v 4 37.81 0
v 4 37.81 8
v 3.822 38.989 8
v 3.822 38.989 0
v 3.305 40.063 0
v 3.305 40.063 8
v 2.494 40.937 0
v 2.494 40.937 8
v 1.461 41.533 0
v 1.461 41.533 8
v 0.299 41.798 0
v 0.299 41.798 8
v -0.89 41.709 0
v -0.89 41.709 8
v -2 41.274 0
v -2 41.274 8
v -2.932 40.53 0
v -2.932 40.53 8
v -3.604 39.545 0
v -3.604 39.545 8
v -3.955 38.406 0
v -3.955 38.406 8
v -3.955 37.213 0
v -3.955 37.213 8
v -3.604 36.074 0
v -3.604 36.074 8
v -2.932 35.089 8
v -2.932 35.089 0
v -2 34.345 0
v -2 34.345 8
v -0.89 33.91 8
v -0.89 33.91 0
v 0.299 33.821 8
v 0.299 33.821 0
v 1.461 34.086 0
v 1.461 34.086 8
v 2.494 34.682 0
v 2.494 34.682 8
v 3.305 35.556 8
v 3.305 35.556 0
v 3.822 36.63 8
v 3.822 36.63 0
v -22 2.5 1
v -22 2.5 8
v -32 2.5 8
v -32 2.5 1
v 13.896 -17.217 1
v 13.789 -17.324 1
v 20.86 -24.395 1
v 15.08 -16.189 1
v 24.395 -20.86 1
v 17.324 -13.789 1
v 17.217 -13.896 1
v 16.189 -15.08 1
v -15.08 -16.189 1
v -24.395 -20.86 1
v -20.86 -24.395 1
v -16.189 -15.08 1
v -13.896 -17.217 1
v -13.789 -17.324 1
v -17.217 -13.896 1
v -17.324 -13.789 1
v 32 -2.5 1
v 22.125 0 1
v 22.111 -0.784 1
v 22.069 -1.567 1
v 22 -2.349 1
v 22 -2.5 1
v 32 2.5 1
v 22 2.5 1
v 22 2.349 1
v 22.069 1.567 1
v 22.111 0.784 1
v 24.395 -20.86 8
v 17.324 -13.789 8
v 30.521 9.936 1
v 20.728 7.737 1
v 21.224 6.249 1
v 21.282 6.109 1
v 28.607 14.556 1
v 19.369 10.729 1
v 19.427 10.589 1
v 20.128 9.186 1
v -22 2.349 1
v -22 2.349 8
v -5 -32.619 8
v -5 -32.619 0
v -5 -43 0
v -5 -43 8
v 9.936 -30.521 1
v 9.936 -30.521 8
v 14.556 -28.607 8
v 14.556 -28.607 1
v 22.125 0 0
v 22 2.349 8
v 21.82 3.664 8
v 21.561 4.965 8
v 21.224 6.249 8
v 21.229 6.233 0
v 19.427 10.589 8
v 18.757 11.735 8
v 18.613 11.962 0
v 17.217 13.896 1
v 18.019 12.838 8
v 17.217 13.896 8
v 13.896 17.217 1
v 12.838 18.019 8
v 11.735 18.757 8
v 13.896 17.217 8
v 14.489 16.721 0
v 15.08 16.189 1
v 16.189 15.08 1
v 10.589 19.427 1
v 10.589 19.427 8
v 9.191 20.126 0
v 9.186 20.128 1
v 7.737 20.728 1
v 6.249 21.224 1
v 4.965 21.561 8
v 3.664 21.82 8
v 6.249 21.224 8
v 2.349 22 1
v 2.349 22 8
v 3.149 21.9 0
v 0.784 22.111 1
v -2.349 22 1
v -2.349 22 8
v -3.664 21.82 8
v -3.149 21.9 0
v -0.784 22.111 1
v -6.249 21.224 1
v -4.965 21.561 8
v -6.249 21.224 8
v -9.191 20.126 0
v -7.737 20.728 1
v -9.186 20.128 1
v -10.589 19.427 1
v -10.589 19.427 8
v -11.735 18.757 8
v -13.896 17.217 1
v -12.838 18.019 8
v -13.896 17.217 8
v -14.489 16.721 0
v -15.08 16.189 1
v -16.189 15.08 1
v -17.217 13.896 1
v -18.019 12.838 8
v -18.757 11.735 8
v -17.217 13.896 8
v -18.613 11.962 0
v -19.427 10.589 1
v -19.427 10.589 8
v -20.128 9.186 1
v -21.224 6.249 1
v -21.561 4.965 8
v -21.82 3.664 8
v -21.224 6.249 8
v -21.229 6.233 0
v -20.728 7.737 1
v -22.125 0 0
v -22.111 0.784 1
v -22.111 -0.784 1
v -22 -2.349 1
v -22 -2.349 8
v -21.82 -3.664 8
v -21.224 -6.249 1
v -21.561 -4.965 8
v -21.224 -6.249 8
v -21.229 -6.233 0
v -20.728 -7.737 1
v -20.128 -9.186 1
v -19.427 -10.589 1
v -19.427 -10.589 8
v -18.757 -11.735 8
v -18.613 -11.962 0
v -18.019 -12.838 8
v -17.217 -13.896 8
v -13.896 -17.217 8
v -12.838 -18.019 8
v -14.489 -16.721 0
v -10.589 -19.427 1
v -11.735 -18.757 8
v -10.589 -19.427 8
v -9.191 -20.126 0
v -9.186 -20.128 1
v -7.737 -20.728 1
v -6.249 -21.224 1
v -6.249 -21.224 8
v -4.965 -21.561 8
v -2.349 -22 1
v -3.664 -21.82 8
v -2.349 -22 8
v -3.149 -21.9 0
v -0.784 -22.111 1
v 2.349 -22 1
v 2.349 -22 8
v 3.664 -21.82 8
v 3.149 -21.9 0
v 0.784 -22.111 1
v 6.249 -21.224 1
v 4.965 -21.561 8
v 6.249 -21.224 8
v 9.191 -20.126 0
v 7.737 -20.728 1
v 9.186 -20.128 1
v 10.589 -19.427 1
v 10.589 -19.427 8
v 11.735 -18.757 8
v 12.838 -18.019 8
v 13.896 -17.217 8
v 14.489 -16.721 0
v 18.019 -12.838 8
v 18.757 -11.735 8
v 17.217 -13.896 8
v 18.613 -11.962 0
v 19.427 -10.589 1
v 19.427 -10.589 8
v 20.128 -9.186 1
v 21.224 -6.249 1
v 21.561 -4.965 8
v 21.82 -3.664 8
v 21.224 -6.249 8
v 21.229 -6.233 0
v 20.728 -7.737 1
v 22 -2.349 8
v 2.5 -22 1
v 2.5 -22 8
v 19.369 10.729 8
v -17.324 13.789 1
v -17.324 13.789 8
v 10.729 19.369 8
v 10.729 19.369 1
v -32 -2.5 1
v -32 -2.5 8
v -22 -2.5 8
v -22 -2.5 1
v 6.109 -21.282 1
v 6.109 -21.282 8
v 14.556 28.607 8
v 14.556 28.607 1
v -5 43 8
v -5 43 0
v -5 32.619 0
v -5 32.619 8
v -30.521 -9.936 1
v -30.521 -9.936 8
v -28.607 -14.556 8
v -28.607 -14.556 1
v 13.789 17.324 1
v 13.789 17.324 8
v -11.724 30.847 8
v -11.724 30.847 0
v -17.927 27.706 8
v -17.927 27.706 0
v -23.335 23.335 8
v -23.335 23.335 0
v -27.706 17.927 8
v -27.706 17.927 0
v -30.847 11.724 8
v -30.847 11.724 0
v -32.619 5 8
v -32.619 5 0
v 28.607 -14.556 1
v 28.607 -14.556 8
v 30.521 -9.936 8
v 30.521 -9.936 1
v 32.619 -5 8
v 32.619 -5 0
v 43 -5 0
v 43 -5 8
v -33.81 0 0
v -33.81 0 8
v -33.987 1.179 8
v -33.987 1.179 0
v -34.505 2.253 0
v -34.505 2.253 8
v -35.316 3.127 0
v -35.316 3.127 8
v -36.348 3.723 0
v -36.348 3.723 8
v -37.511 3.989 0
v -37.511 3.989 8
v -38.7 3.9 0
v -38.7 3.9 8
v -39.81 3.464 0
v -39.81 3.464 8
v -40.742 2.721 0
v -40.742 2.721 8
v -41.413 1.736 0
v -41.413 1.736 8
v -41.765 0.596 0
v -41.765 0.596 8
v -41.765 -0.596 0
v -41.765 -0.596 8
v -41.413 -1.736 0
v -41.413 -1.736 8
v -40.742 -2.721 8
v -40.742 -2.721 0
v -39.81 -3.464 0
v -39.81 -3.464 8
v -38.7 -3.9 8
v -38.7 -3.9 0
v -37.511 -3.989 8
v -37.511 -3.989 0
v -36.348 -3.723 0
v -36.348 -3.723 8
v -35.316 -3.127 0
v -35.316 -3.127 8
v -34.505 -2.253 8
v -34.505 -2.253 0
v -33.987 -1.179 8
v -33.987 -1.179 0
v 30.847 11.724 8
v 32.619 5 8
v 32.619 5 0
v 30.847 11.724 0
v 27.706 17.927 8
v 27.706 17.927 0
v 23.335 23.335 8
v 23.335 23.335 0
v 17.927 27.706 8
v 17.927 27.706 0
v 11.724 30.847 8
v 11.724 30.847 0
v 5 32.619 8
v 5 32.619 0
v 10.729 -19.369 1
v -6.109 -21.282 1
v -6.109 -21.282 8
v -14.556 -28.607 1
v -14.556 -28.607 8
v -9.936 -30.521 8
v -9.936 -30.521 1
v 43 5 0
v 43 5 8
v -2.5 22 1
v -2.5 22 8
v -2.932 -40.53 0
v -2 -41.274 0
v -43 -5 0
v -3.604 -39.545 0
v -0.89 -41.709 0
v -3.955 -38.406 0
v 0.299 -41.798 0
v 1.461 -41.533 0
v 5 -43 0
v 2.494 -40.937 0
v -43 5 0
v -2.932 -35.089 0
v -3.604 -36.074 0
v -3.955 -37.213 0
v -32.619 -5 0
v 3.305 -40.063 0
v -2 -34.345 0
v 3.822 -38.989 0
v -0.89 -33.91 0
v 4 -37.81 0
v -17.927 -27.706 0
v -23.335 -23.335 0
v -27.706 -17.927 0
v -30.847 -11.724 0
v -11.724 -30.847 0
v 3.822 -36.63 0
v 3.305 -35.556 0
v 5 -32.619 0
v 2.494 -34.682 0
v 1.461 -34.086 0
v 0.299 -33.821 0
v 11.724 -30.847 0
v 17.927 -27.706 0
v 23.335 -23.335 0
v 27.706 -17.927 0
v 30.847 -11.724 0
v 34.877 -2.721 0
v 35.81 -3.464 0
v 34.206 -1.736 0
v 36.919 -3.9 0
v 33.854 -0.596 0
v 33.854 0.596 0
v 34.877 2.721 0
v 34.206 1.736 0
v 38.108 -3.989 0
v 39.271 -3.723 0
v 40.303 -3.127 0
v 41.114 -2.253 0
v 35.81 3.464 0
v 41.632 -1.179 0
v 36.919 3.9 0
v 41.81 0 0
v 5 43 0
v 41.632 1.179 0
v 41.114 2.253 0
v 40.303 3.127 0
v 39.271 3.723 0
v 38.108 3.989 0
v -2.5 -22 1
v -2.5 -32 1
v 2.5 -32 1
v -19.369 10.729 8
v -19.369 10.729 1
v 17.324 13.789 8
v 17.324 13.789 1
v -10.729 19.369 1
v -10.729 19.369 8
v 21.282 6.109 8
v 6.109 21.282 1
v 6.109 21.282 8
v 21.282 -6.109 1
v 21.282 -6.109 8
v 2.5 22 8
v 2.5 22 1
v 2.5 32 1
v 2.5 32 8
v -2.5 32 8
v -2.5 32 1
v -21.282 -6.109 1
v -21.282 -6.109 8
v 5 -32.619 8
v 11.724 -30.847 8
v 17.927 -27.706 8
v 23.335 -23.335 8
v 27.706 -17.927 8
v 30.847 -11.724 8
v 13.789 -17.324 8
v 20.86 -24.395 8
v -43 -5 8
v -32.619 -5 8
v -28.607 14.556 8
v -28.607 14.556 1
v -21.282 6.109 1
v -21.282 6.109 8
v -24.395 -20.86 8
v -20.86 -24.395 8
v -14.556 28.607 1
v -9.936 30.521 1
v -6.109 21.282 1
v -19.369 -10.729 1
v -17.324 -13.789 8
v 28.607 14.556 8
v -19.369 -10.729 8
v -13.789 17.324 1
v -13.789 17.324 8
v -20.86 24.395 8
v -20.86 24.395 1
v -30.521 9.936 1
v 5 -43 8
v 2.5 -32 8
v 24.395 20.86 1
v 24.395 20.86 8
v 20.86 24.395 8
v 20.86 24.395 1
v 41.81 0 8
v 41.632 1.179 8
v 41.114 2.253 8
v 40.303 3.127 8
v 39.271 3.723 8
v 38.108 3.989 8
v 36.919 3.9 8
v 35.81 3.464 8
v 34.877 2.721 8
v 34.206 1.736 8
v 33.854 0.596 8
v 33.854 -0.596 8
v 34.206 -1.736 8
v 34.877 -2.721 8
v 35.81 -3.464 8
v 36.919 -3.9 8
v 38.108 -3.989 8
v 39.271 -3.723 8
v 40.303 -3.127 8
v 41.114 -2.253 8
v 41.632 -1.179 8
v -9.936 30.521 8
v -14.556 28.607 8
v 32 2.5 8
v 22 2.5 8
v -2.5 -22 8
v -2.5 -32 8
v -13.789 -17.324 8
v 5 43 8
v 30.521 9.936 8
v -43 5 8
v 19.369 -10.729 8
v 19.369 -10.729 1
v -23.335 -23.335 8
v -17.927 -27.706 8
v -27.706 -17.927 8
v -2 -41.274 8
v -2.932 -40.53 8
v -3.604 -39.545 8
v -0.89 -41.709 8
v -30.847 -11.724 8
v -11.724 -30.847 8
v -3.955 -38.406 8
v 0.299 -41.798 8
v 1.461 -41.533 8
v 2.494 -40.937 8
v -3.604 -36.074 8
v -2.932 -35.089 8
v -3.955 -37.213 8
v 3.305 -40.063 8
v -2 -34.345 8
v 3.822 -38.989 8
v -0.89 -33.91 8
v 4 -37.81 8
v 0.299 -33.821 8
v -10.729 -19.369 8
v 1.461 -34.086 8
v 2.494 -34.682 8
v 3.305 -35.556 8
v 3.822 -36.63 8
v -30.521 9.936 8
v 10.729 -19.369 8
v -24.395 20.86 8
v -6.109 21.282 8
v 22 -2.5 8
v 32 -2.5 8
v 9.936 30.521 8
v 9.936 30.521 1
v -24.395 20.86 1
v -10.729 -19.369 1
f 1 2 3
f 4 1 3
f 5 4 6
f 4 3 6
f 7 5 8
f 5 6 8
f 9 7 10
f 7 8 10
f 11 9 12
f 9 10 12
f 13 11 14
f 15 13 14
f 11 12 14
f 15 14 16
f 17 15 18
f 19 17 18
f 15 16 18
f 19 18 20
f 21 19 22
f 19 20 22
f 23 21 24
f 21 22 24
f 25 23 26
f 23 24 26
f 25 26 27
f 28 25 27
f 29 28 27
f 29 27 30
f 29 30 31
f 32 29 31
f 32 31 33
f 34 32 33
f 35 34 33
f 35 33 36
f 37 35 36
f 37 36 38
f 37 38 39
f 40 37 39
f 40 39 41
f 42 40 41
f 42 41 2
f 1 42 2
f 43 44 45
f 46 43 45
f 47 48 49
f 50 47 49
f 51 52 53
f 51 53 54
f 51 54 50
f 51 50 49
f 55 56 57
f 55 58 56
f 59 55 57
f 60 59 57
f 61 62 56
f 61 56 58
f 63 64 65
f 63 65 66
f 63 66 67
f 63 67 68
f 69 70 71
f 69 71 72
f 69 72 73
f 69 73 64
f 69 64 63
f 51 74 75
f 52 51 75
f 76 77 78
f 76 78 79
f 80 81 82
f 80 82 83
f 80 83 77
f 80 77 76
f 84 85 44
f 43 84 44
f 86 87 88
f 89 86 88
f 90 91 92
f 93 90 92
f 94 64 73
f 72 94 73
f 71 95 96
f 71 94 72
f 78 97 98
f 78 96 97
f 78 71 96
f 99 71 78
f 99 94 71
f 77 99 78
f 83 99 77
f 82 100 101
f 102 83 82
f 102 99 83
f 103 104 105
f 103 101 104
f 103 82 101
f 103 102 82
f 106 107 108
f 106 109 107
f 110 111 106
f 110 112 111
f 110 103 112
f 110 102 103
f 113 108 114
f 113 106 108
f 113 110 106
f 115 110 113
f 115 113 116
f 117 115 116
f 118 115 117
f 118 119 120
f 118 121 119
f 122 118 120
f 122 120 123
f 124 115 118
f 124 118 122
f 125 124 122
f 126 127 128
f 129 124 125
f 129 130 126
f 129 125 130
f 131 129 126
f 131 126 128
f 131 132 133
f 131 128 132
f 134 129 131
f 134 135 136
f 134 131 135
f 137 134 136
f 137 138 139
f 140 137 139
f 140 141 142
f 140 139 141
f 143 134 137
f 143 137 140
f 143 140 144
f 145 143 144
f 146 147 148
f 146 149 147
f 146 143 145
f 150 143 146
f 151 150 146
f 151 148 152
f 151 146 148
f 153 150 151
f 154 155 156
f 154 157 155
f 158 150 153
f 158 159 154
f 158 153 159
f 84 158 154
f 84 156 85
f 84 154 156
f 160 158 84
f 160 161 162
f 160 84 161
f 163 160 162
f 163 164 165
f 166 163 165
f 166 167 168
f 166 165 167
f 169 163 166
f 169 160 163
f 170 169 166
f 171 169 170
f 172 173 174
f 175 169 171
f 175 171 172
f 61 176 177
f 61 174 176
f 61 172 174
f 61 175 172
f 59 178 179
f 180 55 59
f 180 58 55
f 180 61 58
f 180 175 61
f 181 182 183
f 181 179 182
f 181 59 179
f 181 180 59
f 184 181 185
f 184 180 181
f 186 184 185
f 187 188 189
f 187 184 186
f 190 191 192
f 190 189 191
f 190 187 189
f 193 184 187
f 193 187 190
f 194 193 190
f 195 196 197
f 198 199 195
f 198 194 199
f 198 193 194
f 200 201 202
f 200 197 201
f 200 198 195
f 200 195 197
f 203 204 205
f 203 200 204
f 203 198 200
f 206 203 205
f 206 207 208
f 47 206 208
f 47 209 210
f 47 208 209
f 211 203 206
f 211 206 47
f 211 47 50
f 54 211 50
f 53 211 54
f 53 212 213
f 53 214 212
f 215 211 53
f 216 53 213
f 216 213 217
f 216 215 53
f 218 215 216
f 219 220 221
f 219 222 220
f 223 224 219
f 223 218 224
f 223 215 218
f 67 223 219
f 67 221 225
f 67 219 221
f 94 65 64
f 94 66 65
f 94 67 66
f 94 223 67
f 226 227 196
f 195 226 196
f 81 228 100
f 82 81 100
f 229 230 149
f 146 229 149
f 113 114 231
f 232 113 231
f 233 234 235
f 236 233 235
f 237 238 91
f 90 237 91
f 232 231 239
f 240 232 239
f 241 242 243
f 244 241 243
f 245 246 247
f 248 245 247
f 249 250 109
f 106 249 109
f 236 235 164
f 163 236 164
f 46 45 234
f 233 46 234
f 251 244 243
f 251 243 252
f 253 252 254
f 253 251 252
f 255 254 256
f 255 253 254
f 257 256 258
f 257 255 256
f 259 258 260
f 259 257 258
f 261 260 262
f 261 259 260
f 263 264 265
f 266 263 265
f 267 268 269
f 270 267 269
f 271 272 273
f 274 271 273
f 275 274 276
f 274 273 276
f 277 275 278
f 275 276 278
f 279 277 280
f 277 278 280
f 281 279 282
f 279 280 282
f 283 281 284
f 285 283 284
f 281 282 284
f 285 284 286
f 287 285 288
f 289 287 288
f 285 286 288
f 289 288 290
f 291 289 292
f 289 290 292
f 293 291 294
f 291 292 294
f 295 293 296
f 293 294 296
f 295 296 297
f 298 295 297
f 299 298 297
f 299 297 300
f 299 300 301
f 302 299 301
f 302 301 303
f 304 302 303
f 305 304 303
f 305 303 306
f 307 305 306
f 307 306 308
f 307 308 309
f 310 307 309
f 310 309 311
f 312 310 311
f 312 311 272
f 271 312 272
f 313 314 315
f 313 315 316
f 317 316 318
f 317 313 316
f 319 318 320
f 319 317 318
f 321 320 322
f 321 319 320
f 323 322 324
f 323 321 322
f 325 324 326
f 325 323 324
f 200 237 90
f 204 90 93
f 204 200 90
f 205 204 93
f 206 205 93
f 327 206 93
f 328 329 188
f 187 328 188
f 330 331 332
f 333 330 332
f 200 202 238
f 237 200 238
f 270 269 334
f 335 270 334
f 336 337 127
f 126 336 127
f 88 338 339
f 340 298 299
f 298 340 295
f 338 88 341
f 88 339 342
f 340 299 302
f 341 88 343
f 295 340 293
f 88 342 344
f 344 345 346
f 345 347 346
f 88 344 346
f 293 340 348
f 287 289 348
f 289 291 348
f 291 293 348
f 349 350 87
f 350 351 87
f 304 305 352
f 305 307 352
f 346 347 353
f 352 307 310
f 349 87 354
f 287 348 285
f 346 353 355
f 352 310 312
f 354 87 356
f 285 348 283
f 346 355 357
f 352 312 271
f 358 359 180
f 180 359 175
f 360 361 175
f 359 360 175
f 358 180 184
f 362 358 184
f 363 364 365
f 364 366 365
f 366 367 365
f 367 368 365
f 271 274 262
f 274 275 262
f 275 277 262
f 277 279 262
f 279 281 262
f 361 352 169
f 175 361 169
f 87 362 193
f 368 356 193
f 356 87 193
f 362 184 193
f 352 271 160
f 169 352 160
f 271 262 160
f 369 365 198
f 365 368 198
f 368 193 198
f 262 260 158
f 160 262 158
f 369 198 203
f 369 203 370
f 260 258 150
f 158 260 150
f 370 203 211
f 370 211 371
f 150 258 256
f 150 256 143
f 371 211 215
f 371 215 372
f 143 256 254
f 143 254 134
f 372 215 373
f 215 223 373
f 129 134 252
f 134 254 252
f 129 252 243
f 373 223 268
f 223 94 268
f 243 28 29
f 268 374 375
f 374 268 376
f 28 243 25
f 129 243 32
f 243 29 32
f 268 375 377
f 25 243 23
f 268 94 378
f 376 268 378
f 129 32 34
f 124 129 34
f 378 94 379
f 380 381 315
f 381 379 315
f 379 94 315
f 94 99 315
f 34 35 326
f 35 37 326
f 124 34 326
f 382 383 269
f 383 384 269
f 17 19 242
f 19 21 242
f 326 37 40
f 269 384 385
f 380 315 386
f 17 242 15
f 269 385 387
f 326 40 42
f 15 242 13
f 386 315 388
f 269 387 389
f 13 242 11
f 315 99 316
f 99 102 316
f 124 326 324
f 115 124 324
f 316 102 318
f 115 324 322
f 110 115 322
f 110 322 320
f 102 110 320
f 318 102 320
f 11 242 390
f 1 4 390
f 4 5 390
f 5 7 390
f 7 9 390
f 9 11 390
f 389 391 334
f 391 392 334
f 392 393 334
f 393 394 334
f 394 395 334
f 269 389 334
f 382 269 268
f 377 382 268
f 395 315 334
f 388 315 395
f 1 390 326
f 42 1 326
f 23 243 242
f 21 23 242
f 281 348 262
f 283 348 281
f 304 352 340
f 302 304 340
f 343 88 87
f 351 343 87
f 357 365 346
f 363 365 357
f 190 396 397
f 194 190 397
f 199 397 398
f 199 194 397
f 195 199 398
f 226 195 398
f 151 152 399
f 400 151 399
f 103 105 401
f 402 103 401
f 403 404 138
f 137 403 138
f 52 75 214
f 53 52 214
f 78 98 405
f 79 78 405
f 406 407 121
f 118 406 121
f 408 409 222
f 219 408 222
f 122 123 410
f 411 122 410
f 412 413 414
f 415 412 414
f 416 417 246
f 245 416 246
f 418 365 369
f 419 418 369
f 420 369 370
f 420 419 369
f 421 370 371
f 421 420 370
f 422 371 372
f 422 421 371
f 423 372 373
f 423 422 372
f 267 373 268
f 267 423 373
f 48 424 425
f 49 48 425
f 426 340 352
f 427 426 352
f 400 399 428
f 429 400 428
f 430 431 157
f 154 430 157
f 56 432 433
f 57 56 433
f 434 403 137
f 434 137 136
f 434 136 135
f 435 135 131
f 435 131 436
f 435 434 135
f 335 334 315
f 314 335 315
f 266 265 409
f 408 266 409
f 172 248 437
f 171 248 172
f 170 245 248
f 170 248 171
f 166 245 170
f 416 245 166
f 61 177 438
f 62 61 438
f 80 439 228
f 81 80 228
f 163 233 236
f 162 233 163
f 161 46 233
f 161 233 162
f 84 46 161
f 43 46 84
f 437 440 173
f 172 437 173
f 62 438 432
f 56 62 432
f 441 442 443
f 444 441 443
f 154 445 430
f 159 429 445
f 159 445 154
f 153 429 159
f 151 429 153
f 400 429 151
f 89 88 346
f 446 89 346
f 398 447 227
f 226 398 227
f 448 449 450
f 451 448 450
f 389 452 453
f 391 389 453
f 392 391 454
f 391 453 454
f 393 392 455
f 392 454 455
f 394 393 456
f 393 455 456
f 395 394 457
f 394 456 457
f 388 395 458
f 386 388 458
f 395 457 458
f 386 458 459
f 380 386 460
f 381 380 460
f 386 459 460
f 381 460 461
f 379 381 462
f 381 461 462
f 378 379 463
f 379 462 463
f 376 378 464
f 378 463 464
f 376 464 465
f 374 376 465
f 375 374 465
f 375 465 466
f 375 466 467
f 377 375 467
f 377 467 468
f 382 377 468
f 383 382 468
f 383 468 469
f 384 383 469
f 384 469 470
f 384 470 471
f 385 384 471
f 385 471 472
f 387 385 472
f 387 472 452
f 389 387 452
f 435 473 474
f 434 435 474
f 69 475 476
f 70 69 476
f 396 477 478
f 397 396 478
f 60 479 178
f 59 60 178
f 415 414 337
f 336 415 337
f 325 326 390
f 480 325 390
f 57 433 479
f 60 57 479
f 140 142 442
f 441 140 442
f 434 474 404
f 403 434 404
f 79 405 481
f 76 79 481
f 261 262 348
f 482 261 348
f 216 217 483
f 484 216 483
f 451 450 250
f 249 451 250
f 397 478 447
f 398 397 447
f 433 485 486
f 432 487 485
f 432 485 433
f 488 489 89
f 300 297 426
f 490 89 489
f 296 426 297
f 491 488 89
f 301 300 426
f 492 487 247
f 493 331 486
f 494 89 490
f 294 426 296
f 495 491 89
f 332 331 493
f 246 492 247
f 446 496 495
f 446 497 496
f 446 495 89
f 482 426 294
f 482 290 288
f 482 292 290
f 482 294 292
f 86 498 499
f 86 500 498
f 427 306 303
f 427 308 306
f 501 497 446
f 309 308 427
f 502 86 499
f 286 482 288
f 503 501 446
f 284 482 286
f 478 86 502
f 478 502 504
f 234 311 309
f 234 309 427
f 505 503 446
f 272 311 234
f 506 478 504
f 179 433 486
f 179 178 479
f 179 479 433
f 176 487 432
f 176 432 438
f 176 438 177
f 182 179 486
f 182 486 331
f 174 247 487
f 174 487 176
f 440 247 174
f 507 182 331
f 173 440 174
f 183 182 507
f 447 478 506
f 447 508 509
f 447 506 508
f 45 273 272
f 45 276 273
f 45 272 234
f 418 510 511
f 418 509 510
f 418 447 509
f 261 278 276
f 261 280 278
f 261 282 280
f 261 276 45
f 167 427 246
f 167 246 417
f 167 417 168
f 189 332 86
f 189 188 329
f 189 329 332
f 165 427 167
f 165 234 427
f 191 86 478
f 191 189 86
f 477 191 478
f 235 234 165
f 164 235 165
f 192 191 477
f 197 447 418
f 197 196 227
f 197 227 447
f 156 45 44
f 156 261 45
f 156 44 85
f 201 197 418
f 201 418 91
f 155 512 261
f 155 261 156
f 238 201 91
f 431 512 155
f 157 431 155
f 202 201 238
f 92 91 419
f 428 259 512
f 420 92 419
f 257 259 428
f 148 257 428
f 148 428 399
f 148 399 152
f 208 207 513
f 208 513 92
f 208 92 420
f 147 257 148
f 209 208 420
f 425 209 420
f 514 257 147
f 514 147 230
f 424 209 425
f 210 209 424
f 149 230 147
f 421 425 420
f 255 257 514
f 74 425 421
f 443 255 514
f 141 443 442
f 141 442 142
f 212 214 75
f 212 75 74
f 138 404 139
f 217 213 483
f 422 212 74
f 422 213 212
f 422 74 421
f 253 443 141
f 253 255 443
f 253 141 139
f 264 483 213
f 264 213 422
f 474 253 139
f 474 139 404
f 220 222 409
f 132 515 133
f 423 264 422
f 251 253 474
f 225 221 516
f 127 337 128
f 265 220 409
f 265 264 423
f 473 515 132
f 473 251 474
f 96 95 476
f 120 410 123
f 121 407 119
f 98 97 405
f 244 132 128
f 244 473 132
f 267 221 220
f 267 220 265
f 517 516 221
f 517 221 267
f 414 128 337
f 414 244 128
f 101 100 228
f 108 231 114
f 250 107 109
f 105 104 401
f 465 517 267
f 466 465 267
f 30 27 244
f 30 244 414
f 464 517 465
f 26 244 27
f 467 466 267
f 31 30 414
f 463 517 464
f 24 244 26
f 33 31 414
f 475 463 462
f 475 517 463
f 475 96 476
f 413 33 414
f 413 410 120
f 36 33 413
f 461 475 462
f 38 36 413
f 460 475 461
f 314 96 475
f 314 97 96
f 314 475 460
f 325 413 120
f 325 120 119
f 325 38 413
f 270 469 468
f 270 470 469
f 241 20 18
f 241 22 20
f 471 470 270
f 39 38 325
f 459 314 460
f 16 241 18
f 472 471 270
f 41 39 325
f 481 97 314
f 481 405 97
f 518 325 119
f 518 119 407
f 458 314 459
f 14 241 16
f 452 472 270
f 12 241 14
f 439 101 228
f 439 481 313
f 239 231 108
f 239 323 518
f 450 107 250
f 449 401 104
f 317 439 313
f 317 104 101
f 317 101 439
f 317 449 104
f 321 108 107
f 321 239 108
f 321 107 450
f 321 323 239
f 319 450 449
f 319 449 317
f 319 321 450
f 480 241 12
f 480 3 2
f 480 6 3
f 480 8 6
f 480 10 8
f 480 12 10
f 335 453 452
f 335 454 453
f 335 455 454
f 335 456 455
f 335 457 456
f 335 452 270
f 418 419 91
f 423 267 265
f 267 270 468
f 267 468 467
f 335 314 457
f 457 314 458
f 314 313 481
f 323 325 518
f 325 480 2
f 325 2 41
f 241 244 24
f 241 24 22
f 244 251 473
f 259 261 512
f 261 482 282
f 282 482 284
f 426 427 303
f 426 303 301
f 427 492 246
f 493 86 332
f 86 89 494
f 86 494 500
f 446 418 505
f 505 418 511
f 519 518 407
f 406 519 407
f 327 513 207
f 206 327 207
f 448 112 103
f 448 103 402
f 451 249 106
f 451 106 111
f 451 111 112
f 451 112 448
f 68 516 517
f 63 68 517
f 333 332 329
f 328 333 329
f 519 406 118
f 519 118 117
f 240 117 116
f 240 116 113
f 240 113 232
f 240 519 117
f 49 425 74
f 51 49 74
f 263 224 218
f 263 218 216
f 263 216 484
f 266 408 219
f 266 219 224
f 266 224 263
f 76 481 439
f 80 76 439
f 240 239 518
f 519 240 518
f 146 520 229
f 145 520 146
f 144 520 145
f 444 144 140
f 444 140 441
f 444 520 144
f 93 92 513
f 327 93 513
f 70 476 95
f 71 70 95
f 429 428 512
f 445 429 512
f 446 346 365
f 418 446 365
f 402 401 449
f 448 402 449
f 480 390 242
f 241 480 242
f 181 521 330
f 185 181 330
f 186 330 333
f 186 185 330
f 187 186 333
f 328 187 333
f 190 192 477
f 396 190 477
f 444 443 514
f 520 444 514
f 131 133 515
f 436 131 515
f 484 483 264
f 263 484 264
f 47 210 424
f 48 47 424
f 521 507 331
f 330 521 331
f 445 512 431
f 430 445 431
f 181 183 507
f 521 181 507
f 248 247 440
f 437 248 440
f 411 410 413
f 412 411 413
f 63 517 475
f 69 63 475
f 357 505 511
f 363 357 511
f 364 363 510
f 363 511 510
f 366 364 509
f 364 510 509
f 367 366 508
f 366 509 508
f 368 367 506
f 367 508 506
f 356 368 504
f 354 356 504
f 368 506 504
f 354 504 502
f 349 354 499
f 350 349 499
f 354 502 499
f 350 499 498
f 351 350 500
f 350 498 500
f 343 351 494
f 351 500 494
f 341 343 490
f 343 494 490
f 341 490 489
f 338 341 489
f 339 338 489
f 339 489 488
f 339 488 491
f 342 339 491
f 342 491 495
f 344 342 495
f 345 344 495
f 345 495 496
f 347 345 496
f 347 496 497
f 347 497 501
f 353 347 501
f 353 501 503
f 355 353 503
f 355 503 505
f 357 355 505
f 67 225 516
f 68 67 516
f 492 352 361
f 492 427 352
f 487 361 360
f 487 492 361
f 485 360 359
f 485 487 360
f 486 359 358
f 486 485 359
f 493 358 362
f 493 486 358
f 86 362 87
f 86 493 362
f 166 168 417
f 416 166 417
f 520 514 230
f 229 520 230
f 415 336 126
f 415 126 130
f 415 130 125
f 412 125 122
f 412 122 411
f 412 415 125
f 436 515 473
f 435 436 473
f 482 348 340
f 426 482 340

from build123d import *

# Parameters (mm, degrees)
F0_W     = 33
F0_H     = 8
F2_R     = 22.125
F3_DEPTH = 25
F5_DEPTH = 7
F7_DEPTH = 8
F8_R     = 4
F9_DEPTH = 25


with BuildPart() as f1:
    # F0 (on Front) → F1 (revolve)
    with BuildSketch(Plane.XZ):
        with Locations((16.5, 4)):
            Rectangle(F0_W, F0_H)
    revolve(axis=Axis((0, 0, 4), (0, 0, 1)))

    # F2 (on Top) → F3 (cut)
    with BuildSketch(Plane.XY):
        Circle(F2_R)
    extrude(amount=F3_DEPTH, mode=Mode.SUBTRACT)

    # F4 (on face) → F5 (cut)
    with BuildSketch(Plane.XY.offset(8)):
        Polygon((-2.5, 22), (0, 22), (2.5, 22), (2.5, 32), (-2.5, 32), align=None)
        Polygon((-14.555569, 28.607436), (-10.728734, 19.368641), (-8.419036, 20.32535), (-6.109337, 21.282058), (-9.936171, 30.520854), align=None)
        Polygon((-24.395184, 20.85965), (-17.324116, 13.788582), (-15.556349, 15.556349), (-13.788582, 17.324116), (-20.85965, 24.395184), align=None)
        Polygon((-30.520854, 9.936171), (-21.282058, 6.109337), (-20.32535, 8.419036), (-19.368641, 10.728734), (-28.607436, 14.555569), align=None)
        Polygon((-32, -2.5), (-22, -2.5), (-22, 0), (-22, 2.5), (-32, 2.5), align=None)
        Polygon((-28.607436, -14.555569), (-19.368641, -10.728734), (-20.32535, -8.419036), (-21.282058, -6.109337), (-30.520854, -9.936171), align=None)
        Polygon((-20.85965, -24.395184), (-13.788582, -17.324116), (-15.556349, -15.556349), (-17.324116, -13.788582), (-24.395184, -20.85965), align=None)
        Polygon((-9.936171, -30.520854), (-6.109337, -21.282058), (-8.419036, -20.32535), (-10.728734, -19.368641), (-14.555569, -28.607436), align=None)
        Polygon((2.5, -32), (2.5, -22), (0, -22), (-2.5, -22), (-2.5, -32), align=None)
        Polygon((14.555569, -28.607436), (10.728734, -19.368641), (8.419036, -20.32535), (6.109337, -21.282058), (9.936171, -30.520854), align=None)
        Polygon((24.395184, -20.85965), (17.324116, -13.788582), (15.556349, -15.556349), (13.788582, -17.324116), (20.85965, -24.395184), align=None)
        Polygon((30.520854, -9.936171), (21.282058, -6.109337), (20.32535, -8.419036), (19.368641, -10.728734), (28.607436, -14.555569), align=None)
        Polygon((32, 2.5), (22, 2.5), (22, 0), (22, -2.5), (32, -2.5), align=None)
        Polygon((28.607436, 14.555569), (19.368641, 10.728734), (20.32535, 8.419036), (21.282058, 6.109337), (30.520854, 9.936171), align=None)
        Polygon((20.85965, 24.395184), (13.788582, 17.324116), (15.556349, 15.556349), (17.324116, 13.788582), (24.395184, 20.85965), align=None)
        Polygon((9.936171, 30.520854), (6.109337, 21.282058), (8.419036, 20.32535), (10.728734, 19.368641), (14.555569, 28.607436), align=None)
    extrude(amount=-F5_DEPTH, mode=Mode.SUBTRACT)

    # F6 (on Top) → F7 (join)
    with BuildSketch(Plane.XY):
        Polygon((43, -5), (43, 0), (43, 5), (32.619013, 5), (32.619013, -5), align=None)
        Polygon((5, 32.619013), (5, 43), (0, 43), (-5, 43), (-5, 32.619013), align=None)
        Polygon((-32.619013, 5), (-43, 5), (-43, 0), (-43, -5), (-32.619013, -5), align=None)
        Polygon((-5, -32.619013), (-5, -43), (0, -43), (5, -43), (5, -32.619013), align=None)
    extrude(amount=F7_DEPTH)

    # F8 (on face) → F9 (cut)
    with BuildSketch(Plane.XY.offset(8)):
        with Locations((0, 37.809506)):
            Circle(F8_R)
        with Locations((37.809506, 0)):
            Circle(F8_R)
        with Locations((-37.809506, 0)):
            Circle(F8_R)
        with Locations((0, -37.809506)):
            Circle(F8_R)
    extrude(amount=-F9_DEPTH, mode=Mode.SUBTRACT)


solid = f1.part
